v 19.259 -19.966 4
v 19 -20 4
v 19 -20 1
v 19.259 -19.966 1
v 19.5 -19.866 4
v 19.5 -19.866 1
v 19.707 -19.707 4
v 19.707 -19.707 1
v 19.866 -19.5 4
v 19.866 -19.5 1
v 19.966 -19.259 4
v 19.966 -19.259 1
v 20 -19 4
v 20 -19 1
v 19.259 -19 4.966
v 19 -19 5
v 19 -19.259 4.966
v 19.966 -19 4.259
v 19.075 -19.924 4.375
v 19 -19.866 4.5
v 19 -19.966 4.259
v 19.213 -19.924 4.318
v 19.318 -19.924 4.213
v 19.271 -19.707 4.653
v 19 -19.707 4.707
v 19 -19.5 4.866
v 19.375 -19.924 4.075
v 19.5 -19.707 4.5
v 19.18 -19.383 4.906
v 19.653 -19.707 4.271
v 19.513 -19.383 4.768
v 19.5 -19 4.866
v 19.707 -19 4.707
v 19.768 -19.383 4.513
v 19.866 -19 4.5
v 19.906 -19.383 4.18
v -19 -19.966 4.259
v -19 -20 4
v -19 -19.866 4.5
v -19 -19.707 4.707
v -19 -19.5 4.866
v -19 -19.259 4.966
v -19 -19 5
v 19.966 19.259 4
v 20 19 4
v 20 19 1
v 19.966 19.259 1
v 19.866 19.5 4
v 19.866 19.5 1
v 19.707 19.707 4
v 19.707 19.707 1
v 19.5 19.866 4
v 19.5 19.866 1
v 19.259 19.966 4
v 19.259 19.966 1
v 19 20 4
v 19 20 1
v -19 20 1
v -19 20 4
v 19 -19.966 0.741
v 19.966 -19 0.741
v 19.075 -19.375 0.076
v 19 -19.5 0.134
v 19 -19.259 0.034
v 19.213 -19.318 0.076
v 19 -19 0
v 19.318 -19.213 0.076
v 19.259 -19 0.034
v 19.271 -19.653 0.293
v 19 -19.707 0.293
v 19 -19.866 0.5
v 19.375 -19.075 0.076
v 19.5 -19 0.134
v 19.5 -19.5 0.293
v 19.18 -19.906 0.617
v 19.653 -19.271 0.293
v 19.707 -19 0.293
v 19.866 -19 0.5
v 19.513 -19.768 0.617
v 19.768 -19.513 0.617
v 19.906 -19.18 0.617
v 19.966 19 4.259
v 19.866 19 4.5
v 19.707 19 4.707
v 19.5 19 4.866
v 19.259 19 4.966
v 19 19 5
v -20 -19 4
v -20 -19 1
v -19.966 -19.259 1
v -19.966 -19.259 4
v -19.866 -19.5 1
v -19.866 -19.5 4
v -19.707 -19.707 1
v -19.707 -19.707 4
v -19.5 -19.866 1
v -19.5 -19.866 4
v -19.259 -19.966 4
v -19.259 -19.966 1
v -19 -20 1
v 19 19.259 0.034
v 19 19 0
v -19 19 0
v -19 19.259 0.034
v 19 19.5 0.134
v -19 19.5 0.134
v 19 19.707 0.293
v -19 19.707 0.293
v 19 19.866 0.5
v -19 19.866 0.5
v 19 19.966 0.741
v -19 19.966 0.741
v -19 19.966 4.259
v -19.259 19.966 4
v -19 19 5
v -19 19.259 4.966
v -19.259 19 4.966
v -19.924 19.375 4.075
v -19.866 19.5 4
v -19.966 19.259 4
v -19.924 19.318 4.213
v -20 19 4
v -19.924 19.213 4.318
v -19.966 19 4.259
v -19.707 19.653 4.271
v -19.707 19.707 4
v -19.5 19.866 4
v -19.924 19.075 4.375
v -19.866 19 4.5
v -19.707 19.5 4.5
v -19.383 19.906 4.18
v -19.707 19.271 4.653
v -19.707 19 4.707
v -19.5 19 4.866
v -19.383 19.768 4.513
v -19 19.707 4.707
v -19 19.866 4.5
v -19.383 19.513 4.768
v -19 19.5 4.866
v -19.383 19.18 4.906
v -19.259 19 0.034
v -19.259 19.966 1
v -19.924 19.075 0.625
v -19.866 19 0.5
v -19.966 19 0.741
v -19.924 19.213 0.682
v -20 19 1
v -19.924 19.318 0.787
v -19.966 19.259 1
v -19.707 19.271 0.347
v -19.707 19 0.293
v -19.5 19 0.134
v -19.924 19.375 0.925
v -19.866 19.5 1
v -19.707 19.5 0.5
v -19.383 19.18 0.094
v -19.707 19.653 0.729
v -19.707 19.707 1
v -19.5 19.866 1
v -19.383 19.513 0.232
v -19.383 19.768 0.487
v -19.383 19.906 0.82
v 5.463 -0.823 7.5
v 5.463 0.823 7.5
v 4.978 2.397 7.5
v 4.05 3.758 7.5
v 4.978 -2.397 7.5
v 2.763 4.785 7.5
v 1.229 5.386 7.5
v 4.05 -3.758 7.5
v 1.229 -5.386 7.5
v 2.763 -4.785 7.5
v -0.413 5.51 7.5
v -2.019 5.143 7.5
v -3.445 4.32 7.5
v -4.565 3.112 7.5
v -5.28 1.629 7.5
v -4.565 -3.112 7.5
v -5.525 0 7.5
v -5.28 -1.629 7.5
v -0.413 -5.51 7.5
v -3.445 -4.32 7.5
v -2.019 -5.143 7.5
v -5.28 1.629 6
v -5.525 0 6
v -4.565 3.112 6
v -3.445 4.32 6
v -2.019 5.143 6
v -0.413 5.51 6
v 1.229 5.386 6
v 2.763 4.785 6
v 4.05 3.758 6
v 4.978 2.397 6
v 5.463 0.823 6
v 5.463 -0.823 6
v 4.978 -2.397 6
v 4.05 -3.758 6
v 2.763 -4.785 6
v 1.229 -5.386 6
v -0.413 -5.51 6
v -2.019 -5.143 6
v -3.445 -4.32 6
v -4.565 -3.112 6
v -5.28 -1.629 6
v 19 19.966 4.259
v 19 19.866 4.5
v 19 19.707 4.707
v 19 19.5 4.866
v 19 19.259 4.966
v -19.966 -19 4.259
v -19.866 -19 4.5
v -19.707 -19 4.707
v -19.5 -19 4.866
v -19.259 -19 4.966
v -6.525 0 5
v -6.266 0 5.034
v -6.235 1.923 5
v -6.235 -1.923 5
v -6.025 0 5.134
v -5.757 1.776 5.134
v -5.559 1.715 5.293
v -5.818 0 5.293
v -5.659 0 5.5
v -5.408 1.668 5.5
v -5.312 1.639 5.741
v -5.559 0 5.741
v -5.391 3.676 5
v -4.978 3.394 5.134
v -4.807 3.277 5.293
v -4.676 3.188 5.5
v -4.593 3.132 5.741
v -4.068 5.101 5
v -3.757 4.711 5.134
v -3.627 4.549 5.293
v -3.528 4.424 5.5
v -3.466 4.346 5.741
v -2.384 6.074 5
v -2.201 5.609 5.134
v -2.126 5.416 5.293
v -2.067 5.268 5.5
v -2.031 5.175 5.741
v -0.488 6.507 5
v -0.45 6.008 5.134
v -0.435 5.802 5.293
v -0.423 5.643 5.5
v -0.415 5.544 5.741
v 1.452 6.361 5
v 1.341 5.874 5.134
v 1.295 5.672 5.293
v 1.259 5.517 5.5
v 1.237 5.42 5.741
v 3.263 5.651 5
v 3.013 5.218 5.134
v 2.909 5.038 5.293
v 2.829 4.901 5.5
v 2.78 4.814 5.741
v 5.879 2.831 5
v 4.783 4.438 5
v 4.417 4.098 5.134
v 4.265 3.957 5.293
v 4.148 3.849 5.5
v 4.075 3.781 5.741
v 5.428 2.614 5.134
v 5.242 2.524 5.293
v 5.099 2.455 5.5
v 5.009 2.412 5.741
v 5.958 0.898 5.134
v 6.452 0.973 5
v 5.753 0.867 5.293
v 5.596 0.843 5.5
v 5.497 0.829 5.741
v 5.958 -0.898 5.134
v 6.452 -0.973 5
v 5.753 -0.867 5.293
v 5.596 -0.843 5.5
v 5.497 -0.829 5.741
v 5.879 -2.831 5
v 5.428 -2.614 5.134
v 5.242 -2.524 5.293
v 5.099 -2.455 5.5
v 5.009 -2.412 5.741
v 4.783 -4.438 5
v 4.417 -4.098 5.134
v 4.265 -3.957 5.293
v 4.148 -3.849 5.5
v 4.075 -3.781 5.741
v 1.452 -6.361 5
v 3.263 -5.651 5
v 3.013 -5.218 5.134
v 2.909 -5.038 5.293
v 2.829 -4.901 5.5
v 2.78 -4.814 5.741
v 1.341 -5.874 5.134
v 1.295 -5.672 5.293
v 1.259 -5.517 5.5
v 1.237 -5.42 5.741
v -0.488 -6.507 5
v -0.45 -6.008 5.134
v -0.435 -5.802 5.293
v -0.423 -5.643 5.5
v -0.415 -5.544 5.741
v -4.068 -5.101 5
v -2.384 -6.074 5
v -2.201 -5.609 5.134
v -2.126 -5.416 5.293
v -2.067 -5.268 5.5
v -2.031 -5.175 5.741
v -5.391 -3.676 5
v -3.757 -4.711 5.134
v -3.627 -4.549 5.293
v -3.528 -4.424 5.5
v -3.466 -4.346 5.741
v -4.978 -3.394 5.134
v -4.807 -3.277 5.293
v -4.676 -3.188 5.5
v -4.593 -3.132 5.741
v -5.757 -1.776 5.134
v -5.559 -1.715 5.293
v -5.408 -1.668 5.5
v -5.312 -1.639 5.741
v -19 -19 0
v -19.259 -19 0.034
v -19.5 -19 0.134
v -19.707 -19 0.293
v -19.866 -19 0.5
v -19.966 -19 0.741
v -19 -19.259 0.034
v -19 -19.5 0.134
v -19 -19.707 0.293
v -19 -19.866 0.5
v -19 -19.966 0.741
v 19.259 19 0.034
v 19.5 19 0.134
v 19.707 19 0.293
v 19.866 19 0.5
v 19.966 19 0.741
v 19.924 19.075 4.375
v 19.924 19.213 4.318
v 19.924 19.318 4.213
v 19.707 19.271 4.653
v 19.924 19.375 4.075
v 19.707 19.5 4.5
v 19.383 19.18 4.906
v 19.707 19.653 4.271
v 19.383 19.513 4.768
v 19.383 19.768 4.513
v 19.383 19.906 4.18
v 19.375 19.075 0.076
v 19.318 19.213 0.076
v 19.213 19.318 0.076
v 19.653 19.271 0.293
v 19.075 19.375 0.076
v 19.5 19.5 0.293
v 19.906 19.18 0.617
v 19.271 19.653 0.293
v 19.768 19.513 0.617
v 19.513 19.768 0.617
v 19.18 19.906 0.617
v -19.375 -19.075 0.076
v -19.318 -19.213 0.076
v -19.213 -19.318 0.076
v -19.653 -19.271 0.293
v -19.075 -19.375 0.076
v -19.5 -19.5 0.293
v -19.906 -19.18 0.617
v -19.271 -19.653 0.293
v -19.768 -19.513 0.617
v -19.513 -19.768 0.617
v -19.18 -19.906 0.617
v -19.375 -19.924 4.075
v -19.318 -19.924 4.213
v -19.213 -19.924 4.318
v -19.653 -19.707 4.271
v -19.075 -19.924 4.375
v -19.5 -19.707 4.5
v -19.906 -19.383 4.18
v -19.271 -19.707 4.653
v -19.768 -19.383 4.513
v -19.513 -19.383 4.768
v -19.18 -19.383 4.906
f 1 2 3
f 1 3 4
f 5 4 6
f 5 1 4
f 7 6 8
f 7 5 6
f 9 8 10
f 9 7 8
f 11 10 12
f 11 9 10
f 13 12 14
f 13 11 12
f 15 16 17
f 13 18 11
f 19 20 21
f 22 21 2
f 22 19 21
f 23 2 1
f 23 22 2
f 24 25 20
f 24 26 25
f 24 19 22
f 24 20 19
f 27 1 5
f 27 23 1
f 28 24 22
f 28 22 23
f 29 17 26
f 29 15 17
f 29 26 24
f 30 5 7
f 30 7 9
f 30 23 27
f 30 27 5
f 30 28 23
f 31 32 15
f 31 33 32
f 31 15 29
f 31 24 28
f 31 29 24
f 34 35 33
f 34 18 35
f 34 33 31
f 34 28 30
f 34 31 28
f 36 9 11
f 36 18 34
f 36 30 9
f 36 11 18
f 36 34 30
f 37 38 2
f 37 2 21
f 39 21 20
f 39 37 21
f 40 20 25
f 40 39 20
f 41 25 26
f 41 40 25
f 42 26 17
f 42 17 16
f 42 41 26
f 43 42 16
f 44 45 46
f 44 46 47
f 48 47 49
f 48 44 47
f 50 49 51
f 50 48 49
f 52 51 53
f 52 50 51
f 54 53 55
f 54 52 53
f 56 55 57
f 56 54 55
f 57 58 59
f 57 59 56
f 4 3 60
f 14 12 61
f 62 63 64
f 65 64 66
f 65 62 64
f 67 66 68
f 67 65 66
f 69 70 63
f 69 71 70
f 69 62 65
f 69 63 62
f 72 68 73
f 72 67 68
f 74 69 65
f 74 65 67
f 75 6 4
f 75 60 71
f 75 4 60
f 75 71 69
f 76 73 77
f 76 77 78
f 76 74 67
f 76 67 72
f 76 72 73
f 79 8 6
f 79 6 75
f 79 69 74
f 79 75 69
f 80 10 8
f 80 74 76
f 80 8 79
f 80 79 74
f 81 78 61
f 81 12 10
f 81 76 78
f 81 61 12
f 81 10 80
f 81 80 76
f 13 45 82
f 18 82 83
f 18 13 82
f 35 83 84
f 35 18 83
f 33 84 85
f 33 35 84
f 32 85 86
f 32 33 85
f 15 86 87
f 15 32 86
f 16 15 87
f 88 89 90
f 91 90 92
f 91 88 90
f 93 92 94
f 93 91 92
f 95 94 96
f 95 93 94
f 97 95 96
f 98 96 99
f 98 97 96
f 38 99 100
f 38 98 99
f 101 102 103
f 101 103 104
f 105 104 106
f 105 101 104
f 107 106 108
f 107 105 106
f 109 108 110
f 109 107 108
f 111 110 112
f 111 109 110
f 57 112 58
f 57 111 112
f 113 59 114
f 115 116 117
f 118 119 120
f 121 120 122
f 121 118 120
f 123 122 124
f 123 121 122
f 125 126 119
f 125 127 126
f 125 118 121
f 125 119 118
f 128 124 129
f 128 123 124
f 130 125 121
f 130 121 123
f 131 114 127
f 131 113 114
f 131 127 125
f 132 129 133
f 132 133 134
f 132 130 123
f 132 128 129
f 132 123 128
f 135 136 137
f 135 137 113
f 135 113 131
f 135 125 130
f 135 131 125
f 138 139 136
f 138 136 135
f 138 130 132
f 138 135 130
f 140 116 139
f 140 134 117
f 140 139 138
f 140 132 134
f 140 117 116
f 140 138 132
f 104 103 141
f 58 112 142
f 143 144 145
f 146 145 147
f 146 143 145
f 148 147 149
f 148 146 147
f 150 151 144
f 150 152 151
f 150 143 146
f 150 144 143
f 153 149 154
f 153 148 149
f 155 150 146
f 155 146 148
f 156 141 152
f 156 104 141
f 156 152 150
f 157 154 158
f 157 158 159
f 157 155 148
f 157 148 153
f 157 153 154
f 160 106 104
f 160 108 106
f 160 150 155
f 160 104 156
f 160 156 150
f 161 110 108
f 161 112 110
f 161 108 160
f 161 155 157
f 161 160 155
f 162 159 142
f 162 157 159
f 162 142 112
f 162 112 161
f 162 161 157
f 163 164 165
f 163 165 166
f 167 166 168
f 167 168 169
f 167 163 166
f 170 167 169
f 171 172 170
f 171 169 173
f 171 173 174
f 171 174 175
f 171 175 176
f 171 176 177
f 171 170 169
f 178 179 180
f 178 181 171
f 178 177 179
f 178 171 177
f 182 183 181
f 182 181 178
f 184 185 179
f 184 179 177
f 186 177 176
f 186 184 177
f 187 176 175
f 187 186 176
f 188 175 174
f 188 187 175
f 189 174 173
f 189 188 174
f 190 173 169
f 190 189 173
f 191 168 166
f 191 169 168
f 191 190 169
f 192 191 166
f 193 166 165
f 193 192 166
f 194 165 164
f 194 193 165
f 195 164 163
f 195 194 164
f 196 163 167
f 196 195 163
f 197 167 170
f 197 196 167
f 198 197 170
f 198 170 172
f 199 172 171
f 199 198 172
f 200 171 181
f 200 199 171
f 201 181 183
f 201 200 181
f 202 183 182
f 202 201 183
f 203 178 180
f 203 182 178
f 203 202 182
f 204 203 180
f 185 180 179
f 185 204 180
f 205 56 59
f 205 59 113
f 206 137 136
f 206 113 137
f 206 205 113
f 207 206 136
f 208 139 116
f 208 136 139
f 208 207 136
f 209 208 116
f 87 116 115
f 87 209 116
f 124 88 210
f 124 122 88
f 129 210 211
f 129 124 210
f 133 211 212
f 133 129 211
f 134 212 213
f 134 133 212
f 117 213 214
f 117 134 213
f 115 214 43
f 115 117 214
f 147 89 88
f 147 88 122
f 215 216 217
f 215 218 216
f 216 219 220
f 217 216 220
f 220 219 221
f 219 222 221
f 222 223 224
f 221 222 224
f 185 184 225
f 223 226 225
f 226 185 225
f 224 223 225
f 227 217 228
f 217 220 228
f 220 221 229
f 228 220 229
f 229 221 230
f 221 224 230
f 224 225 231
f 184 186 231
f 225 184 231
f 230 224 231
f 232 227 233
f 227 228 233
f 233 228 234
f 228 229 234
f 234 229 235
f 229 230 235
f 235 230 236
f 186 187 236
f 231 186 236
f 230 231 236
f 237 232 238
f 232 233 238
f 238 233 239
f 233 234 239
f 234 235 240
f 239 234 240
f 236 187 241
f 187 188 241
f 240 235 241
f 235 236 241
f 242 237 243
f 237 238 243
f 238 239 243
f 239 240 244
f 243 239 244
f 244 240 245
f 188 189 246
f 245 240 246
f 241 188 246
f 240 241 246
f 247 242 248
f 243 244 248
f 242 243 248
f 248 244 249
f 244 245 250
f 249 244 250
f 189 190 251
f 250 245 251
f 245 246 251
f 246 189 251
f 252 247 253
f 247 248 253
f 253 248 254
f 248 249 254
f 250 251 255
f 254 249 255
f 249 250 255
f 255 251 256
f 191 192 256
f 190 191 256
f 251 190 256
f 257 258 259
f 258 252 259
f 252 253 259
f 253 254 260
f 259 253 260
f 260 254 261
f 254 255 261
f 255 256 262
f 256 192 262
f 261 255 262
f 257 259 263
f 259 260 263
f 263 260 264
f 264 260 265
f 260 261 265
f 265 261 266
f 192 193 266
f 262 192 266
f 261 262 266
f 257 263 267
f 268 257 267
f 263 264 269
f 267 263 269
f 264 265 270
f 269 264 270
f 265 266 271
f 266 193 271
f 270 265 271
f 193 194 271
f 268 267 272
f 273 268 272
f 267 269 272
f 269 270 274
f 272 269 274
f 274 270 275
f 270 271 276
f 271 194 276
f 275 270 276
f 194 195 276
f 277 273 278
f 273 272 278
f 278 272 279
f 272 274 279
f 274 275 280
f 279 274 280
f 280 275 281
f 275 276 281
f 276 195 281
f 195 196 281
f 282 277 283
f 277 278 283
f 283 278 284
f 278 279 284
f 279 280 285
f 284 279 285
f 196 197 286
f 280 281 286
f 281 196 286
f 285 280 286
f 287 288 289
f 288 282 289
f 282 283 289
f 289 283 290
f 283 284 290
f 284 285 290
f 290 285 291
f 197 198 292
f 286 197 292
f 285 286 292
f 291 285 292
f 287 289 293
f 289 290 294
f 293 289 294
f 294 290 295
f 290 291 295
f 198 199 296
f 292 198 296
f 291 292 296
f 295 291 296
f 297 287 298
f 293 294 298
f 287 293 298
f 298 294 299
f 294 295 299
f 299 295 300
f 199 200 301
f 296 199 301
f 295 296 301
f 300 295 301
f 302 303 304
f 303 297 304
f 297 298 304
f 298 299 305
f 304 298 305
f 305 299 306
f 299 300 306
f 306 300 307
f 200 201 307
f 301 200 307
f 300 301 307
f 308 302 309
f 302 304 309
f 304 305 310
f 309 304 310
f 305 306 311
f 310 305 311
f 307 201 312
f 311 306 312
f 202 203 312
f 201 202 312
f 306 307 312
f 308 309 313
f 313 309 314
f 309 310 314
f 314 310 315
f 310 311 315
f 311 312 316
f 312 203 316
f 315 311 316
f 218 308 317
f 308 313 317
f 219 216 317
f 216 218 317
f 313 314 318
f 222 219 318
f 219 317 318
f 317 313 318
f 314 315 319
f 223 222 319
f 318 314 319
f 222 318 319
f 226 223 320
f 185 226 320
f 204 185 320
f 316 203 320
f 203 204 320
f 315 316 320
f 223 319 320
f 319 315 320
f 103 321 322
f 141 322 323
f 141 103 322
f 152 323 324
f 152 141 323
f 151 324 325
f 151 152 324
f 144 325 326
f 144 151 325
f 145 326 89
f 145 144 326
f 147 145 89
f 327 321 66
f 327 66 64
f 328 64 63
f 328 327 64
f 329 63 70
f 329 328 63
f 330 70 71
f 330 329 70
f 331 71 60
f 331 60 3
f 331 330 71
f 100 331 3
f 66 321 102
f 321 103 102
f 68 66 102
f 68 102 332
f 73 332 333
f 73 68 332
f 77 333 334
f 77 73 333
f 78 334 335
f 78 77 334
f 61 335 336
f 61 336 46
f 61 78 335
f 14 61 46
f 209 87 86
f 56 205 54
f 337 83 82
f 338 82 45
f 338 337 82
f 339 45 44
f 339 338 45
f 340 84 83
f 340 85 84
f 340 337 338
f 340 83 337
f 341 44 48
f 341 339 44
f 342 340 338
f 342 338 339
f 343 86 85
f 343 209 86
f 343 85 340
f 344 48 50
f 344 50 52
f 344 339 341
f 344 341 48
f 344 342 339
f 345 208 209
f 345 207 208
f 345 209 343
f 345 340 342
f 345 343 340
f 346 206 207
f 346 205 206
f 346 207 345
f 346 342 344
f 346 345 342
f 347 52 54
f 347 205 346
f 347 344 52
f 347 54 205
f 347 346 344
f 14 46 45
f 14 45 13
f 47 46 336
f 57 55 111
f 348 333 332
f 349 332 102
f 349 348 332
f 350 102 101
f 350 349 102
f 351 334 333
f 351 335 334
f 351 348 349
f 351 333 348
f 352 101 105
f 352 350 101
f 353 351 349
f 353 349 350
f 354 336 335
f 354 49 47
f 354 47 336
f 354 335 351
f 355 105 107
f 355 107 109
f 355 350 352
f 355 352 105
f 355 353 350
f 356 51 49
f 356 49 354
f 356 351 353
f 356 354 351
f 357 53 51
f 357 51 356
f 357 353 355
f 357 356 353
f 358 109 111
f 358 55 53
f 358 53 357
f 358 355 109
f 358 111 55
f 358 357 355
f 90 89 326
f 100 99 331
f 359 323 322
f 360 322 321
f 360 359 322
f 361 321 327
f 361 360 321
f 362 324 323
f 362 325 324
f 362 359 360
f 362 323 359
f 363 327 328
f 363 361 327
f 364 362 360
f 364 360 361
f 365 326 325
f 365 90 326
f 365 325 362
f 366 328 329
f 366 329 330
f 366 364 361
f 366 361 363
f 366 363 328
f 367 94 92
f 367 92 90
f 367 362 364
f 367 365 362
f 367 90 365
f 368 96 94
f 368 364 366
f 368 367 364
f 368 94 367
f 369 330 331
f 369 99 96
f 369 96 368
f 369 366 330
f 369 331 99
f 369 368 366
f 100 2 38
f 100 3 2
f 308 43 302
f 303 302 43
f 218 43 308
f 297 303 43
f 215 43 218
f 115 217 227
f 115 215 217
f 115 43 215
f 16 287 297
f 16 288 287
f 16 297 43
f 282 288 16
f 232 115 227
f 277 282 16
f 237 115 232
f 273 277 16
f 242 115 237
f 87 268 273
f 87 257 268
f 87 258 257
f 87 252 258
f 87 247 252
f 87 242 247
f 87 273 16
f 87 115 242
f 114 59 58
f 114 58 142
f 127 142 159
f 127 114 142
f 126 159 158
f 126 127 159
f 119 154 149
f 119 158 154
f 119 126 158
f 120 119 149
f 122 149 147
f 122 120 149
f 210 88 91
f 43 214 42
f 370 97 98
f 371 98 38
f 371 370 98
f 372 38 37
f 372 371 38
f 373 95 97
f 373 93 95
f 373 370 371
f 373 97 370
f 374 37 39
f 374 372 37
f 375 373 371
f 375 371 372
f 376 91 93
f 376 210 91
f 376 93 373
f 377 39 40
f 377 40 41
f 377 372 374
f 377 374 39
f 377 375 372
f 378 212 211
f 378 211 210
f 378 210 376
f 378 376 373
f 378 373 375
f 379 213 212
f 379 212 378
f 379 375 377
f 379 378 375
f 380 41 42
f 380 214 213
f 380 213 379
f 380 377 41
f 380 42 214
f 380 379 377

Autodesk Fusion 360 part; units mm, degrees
sketch "base plate" plane through (0, 0, 0) normal (0, 0, 1) x (1, 0, 0)
  line L0 (-20, 20) -> (20, 20)
  line L1 (20, 20) -> (20, -20)
  line L2 (20, -20) -> (-20, -20)
  line L3 (-20, -20) -> (-20, 20)
  line L4 (-20, 20) -> (20, -20) construction
  line L5 (20, 20) -> (-20, -20) construction
  dimension "d1" = 40
  dimension "d2" = 40
extrude "Extrude1" add sketch "base plate" along normal blind 5
sketch "holder" plane through (0, 0, 5) normal (0, 0, 1) x (-1, 0, 0)
  line L0 (20, 20) -> (-20, 20)
  line L1 (-20, 20) -> (-20, -20)
  line L2 (-20, -20) -> (20, -20)
  line L3 (20, -20) -> (20, 20)
  line L4 (20, 0) -> (-20, 0) construction
  line L5 (0, -20) -> (0, 20) construction
  circle A0 centre (0, 0) radius 5.525
  dimension "d5" = 11.05
extrude "Extrude2" add sketch "holder" along normal blind 2.5 contours A0
fillet "Fillet1" radius 1 6 faces at (0.1376, -15.1699, 5) (6.6667, -20, 3.3333) (20, 6.6667, 3.3333) (-6.6667, 6.6667, 0) (-6.6667, 20, 3.3333) (-20, -6.6667, 3.3333)
